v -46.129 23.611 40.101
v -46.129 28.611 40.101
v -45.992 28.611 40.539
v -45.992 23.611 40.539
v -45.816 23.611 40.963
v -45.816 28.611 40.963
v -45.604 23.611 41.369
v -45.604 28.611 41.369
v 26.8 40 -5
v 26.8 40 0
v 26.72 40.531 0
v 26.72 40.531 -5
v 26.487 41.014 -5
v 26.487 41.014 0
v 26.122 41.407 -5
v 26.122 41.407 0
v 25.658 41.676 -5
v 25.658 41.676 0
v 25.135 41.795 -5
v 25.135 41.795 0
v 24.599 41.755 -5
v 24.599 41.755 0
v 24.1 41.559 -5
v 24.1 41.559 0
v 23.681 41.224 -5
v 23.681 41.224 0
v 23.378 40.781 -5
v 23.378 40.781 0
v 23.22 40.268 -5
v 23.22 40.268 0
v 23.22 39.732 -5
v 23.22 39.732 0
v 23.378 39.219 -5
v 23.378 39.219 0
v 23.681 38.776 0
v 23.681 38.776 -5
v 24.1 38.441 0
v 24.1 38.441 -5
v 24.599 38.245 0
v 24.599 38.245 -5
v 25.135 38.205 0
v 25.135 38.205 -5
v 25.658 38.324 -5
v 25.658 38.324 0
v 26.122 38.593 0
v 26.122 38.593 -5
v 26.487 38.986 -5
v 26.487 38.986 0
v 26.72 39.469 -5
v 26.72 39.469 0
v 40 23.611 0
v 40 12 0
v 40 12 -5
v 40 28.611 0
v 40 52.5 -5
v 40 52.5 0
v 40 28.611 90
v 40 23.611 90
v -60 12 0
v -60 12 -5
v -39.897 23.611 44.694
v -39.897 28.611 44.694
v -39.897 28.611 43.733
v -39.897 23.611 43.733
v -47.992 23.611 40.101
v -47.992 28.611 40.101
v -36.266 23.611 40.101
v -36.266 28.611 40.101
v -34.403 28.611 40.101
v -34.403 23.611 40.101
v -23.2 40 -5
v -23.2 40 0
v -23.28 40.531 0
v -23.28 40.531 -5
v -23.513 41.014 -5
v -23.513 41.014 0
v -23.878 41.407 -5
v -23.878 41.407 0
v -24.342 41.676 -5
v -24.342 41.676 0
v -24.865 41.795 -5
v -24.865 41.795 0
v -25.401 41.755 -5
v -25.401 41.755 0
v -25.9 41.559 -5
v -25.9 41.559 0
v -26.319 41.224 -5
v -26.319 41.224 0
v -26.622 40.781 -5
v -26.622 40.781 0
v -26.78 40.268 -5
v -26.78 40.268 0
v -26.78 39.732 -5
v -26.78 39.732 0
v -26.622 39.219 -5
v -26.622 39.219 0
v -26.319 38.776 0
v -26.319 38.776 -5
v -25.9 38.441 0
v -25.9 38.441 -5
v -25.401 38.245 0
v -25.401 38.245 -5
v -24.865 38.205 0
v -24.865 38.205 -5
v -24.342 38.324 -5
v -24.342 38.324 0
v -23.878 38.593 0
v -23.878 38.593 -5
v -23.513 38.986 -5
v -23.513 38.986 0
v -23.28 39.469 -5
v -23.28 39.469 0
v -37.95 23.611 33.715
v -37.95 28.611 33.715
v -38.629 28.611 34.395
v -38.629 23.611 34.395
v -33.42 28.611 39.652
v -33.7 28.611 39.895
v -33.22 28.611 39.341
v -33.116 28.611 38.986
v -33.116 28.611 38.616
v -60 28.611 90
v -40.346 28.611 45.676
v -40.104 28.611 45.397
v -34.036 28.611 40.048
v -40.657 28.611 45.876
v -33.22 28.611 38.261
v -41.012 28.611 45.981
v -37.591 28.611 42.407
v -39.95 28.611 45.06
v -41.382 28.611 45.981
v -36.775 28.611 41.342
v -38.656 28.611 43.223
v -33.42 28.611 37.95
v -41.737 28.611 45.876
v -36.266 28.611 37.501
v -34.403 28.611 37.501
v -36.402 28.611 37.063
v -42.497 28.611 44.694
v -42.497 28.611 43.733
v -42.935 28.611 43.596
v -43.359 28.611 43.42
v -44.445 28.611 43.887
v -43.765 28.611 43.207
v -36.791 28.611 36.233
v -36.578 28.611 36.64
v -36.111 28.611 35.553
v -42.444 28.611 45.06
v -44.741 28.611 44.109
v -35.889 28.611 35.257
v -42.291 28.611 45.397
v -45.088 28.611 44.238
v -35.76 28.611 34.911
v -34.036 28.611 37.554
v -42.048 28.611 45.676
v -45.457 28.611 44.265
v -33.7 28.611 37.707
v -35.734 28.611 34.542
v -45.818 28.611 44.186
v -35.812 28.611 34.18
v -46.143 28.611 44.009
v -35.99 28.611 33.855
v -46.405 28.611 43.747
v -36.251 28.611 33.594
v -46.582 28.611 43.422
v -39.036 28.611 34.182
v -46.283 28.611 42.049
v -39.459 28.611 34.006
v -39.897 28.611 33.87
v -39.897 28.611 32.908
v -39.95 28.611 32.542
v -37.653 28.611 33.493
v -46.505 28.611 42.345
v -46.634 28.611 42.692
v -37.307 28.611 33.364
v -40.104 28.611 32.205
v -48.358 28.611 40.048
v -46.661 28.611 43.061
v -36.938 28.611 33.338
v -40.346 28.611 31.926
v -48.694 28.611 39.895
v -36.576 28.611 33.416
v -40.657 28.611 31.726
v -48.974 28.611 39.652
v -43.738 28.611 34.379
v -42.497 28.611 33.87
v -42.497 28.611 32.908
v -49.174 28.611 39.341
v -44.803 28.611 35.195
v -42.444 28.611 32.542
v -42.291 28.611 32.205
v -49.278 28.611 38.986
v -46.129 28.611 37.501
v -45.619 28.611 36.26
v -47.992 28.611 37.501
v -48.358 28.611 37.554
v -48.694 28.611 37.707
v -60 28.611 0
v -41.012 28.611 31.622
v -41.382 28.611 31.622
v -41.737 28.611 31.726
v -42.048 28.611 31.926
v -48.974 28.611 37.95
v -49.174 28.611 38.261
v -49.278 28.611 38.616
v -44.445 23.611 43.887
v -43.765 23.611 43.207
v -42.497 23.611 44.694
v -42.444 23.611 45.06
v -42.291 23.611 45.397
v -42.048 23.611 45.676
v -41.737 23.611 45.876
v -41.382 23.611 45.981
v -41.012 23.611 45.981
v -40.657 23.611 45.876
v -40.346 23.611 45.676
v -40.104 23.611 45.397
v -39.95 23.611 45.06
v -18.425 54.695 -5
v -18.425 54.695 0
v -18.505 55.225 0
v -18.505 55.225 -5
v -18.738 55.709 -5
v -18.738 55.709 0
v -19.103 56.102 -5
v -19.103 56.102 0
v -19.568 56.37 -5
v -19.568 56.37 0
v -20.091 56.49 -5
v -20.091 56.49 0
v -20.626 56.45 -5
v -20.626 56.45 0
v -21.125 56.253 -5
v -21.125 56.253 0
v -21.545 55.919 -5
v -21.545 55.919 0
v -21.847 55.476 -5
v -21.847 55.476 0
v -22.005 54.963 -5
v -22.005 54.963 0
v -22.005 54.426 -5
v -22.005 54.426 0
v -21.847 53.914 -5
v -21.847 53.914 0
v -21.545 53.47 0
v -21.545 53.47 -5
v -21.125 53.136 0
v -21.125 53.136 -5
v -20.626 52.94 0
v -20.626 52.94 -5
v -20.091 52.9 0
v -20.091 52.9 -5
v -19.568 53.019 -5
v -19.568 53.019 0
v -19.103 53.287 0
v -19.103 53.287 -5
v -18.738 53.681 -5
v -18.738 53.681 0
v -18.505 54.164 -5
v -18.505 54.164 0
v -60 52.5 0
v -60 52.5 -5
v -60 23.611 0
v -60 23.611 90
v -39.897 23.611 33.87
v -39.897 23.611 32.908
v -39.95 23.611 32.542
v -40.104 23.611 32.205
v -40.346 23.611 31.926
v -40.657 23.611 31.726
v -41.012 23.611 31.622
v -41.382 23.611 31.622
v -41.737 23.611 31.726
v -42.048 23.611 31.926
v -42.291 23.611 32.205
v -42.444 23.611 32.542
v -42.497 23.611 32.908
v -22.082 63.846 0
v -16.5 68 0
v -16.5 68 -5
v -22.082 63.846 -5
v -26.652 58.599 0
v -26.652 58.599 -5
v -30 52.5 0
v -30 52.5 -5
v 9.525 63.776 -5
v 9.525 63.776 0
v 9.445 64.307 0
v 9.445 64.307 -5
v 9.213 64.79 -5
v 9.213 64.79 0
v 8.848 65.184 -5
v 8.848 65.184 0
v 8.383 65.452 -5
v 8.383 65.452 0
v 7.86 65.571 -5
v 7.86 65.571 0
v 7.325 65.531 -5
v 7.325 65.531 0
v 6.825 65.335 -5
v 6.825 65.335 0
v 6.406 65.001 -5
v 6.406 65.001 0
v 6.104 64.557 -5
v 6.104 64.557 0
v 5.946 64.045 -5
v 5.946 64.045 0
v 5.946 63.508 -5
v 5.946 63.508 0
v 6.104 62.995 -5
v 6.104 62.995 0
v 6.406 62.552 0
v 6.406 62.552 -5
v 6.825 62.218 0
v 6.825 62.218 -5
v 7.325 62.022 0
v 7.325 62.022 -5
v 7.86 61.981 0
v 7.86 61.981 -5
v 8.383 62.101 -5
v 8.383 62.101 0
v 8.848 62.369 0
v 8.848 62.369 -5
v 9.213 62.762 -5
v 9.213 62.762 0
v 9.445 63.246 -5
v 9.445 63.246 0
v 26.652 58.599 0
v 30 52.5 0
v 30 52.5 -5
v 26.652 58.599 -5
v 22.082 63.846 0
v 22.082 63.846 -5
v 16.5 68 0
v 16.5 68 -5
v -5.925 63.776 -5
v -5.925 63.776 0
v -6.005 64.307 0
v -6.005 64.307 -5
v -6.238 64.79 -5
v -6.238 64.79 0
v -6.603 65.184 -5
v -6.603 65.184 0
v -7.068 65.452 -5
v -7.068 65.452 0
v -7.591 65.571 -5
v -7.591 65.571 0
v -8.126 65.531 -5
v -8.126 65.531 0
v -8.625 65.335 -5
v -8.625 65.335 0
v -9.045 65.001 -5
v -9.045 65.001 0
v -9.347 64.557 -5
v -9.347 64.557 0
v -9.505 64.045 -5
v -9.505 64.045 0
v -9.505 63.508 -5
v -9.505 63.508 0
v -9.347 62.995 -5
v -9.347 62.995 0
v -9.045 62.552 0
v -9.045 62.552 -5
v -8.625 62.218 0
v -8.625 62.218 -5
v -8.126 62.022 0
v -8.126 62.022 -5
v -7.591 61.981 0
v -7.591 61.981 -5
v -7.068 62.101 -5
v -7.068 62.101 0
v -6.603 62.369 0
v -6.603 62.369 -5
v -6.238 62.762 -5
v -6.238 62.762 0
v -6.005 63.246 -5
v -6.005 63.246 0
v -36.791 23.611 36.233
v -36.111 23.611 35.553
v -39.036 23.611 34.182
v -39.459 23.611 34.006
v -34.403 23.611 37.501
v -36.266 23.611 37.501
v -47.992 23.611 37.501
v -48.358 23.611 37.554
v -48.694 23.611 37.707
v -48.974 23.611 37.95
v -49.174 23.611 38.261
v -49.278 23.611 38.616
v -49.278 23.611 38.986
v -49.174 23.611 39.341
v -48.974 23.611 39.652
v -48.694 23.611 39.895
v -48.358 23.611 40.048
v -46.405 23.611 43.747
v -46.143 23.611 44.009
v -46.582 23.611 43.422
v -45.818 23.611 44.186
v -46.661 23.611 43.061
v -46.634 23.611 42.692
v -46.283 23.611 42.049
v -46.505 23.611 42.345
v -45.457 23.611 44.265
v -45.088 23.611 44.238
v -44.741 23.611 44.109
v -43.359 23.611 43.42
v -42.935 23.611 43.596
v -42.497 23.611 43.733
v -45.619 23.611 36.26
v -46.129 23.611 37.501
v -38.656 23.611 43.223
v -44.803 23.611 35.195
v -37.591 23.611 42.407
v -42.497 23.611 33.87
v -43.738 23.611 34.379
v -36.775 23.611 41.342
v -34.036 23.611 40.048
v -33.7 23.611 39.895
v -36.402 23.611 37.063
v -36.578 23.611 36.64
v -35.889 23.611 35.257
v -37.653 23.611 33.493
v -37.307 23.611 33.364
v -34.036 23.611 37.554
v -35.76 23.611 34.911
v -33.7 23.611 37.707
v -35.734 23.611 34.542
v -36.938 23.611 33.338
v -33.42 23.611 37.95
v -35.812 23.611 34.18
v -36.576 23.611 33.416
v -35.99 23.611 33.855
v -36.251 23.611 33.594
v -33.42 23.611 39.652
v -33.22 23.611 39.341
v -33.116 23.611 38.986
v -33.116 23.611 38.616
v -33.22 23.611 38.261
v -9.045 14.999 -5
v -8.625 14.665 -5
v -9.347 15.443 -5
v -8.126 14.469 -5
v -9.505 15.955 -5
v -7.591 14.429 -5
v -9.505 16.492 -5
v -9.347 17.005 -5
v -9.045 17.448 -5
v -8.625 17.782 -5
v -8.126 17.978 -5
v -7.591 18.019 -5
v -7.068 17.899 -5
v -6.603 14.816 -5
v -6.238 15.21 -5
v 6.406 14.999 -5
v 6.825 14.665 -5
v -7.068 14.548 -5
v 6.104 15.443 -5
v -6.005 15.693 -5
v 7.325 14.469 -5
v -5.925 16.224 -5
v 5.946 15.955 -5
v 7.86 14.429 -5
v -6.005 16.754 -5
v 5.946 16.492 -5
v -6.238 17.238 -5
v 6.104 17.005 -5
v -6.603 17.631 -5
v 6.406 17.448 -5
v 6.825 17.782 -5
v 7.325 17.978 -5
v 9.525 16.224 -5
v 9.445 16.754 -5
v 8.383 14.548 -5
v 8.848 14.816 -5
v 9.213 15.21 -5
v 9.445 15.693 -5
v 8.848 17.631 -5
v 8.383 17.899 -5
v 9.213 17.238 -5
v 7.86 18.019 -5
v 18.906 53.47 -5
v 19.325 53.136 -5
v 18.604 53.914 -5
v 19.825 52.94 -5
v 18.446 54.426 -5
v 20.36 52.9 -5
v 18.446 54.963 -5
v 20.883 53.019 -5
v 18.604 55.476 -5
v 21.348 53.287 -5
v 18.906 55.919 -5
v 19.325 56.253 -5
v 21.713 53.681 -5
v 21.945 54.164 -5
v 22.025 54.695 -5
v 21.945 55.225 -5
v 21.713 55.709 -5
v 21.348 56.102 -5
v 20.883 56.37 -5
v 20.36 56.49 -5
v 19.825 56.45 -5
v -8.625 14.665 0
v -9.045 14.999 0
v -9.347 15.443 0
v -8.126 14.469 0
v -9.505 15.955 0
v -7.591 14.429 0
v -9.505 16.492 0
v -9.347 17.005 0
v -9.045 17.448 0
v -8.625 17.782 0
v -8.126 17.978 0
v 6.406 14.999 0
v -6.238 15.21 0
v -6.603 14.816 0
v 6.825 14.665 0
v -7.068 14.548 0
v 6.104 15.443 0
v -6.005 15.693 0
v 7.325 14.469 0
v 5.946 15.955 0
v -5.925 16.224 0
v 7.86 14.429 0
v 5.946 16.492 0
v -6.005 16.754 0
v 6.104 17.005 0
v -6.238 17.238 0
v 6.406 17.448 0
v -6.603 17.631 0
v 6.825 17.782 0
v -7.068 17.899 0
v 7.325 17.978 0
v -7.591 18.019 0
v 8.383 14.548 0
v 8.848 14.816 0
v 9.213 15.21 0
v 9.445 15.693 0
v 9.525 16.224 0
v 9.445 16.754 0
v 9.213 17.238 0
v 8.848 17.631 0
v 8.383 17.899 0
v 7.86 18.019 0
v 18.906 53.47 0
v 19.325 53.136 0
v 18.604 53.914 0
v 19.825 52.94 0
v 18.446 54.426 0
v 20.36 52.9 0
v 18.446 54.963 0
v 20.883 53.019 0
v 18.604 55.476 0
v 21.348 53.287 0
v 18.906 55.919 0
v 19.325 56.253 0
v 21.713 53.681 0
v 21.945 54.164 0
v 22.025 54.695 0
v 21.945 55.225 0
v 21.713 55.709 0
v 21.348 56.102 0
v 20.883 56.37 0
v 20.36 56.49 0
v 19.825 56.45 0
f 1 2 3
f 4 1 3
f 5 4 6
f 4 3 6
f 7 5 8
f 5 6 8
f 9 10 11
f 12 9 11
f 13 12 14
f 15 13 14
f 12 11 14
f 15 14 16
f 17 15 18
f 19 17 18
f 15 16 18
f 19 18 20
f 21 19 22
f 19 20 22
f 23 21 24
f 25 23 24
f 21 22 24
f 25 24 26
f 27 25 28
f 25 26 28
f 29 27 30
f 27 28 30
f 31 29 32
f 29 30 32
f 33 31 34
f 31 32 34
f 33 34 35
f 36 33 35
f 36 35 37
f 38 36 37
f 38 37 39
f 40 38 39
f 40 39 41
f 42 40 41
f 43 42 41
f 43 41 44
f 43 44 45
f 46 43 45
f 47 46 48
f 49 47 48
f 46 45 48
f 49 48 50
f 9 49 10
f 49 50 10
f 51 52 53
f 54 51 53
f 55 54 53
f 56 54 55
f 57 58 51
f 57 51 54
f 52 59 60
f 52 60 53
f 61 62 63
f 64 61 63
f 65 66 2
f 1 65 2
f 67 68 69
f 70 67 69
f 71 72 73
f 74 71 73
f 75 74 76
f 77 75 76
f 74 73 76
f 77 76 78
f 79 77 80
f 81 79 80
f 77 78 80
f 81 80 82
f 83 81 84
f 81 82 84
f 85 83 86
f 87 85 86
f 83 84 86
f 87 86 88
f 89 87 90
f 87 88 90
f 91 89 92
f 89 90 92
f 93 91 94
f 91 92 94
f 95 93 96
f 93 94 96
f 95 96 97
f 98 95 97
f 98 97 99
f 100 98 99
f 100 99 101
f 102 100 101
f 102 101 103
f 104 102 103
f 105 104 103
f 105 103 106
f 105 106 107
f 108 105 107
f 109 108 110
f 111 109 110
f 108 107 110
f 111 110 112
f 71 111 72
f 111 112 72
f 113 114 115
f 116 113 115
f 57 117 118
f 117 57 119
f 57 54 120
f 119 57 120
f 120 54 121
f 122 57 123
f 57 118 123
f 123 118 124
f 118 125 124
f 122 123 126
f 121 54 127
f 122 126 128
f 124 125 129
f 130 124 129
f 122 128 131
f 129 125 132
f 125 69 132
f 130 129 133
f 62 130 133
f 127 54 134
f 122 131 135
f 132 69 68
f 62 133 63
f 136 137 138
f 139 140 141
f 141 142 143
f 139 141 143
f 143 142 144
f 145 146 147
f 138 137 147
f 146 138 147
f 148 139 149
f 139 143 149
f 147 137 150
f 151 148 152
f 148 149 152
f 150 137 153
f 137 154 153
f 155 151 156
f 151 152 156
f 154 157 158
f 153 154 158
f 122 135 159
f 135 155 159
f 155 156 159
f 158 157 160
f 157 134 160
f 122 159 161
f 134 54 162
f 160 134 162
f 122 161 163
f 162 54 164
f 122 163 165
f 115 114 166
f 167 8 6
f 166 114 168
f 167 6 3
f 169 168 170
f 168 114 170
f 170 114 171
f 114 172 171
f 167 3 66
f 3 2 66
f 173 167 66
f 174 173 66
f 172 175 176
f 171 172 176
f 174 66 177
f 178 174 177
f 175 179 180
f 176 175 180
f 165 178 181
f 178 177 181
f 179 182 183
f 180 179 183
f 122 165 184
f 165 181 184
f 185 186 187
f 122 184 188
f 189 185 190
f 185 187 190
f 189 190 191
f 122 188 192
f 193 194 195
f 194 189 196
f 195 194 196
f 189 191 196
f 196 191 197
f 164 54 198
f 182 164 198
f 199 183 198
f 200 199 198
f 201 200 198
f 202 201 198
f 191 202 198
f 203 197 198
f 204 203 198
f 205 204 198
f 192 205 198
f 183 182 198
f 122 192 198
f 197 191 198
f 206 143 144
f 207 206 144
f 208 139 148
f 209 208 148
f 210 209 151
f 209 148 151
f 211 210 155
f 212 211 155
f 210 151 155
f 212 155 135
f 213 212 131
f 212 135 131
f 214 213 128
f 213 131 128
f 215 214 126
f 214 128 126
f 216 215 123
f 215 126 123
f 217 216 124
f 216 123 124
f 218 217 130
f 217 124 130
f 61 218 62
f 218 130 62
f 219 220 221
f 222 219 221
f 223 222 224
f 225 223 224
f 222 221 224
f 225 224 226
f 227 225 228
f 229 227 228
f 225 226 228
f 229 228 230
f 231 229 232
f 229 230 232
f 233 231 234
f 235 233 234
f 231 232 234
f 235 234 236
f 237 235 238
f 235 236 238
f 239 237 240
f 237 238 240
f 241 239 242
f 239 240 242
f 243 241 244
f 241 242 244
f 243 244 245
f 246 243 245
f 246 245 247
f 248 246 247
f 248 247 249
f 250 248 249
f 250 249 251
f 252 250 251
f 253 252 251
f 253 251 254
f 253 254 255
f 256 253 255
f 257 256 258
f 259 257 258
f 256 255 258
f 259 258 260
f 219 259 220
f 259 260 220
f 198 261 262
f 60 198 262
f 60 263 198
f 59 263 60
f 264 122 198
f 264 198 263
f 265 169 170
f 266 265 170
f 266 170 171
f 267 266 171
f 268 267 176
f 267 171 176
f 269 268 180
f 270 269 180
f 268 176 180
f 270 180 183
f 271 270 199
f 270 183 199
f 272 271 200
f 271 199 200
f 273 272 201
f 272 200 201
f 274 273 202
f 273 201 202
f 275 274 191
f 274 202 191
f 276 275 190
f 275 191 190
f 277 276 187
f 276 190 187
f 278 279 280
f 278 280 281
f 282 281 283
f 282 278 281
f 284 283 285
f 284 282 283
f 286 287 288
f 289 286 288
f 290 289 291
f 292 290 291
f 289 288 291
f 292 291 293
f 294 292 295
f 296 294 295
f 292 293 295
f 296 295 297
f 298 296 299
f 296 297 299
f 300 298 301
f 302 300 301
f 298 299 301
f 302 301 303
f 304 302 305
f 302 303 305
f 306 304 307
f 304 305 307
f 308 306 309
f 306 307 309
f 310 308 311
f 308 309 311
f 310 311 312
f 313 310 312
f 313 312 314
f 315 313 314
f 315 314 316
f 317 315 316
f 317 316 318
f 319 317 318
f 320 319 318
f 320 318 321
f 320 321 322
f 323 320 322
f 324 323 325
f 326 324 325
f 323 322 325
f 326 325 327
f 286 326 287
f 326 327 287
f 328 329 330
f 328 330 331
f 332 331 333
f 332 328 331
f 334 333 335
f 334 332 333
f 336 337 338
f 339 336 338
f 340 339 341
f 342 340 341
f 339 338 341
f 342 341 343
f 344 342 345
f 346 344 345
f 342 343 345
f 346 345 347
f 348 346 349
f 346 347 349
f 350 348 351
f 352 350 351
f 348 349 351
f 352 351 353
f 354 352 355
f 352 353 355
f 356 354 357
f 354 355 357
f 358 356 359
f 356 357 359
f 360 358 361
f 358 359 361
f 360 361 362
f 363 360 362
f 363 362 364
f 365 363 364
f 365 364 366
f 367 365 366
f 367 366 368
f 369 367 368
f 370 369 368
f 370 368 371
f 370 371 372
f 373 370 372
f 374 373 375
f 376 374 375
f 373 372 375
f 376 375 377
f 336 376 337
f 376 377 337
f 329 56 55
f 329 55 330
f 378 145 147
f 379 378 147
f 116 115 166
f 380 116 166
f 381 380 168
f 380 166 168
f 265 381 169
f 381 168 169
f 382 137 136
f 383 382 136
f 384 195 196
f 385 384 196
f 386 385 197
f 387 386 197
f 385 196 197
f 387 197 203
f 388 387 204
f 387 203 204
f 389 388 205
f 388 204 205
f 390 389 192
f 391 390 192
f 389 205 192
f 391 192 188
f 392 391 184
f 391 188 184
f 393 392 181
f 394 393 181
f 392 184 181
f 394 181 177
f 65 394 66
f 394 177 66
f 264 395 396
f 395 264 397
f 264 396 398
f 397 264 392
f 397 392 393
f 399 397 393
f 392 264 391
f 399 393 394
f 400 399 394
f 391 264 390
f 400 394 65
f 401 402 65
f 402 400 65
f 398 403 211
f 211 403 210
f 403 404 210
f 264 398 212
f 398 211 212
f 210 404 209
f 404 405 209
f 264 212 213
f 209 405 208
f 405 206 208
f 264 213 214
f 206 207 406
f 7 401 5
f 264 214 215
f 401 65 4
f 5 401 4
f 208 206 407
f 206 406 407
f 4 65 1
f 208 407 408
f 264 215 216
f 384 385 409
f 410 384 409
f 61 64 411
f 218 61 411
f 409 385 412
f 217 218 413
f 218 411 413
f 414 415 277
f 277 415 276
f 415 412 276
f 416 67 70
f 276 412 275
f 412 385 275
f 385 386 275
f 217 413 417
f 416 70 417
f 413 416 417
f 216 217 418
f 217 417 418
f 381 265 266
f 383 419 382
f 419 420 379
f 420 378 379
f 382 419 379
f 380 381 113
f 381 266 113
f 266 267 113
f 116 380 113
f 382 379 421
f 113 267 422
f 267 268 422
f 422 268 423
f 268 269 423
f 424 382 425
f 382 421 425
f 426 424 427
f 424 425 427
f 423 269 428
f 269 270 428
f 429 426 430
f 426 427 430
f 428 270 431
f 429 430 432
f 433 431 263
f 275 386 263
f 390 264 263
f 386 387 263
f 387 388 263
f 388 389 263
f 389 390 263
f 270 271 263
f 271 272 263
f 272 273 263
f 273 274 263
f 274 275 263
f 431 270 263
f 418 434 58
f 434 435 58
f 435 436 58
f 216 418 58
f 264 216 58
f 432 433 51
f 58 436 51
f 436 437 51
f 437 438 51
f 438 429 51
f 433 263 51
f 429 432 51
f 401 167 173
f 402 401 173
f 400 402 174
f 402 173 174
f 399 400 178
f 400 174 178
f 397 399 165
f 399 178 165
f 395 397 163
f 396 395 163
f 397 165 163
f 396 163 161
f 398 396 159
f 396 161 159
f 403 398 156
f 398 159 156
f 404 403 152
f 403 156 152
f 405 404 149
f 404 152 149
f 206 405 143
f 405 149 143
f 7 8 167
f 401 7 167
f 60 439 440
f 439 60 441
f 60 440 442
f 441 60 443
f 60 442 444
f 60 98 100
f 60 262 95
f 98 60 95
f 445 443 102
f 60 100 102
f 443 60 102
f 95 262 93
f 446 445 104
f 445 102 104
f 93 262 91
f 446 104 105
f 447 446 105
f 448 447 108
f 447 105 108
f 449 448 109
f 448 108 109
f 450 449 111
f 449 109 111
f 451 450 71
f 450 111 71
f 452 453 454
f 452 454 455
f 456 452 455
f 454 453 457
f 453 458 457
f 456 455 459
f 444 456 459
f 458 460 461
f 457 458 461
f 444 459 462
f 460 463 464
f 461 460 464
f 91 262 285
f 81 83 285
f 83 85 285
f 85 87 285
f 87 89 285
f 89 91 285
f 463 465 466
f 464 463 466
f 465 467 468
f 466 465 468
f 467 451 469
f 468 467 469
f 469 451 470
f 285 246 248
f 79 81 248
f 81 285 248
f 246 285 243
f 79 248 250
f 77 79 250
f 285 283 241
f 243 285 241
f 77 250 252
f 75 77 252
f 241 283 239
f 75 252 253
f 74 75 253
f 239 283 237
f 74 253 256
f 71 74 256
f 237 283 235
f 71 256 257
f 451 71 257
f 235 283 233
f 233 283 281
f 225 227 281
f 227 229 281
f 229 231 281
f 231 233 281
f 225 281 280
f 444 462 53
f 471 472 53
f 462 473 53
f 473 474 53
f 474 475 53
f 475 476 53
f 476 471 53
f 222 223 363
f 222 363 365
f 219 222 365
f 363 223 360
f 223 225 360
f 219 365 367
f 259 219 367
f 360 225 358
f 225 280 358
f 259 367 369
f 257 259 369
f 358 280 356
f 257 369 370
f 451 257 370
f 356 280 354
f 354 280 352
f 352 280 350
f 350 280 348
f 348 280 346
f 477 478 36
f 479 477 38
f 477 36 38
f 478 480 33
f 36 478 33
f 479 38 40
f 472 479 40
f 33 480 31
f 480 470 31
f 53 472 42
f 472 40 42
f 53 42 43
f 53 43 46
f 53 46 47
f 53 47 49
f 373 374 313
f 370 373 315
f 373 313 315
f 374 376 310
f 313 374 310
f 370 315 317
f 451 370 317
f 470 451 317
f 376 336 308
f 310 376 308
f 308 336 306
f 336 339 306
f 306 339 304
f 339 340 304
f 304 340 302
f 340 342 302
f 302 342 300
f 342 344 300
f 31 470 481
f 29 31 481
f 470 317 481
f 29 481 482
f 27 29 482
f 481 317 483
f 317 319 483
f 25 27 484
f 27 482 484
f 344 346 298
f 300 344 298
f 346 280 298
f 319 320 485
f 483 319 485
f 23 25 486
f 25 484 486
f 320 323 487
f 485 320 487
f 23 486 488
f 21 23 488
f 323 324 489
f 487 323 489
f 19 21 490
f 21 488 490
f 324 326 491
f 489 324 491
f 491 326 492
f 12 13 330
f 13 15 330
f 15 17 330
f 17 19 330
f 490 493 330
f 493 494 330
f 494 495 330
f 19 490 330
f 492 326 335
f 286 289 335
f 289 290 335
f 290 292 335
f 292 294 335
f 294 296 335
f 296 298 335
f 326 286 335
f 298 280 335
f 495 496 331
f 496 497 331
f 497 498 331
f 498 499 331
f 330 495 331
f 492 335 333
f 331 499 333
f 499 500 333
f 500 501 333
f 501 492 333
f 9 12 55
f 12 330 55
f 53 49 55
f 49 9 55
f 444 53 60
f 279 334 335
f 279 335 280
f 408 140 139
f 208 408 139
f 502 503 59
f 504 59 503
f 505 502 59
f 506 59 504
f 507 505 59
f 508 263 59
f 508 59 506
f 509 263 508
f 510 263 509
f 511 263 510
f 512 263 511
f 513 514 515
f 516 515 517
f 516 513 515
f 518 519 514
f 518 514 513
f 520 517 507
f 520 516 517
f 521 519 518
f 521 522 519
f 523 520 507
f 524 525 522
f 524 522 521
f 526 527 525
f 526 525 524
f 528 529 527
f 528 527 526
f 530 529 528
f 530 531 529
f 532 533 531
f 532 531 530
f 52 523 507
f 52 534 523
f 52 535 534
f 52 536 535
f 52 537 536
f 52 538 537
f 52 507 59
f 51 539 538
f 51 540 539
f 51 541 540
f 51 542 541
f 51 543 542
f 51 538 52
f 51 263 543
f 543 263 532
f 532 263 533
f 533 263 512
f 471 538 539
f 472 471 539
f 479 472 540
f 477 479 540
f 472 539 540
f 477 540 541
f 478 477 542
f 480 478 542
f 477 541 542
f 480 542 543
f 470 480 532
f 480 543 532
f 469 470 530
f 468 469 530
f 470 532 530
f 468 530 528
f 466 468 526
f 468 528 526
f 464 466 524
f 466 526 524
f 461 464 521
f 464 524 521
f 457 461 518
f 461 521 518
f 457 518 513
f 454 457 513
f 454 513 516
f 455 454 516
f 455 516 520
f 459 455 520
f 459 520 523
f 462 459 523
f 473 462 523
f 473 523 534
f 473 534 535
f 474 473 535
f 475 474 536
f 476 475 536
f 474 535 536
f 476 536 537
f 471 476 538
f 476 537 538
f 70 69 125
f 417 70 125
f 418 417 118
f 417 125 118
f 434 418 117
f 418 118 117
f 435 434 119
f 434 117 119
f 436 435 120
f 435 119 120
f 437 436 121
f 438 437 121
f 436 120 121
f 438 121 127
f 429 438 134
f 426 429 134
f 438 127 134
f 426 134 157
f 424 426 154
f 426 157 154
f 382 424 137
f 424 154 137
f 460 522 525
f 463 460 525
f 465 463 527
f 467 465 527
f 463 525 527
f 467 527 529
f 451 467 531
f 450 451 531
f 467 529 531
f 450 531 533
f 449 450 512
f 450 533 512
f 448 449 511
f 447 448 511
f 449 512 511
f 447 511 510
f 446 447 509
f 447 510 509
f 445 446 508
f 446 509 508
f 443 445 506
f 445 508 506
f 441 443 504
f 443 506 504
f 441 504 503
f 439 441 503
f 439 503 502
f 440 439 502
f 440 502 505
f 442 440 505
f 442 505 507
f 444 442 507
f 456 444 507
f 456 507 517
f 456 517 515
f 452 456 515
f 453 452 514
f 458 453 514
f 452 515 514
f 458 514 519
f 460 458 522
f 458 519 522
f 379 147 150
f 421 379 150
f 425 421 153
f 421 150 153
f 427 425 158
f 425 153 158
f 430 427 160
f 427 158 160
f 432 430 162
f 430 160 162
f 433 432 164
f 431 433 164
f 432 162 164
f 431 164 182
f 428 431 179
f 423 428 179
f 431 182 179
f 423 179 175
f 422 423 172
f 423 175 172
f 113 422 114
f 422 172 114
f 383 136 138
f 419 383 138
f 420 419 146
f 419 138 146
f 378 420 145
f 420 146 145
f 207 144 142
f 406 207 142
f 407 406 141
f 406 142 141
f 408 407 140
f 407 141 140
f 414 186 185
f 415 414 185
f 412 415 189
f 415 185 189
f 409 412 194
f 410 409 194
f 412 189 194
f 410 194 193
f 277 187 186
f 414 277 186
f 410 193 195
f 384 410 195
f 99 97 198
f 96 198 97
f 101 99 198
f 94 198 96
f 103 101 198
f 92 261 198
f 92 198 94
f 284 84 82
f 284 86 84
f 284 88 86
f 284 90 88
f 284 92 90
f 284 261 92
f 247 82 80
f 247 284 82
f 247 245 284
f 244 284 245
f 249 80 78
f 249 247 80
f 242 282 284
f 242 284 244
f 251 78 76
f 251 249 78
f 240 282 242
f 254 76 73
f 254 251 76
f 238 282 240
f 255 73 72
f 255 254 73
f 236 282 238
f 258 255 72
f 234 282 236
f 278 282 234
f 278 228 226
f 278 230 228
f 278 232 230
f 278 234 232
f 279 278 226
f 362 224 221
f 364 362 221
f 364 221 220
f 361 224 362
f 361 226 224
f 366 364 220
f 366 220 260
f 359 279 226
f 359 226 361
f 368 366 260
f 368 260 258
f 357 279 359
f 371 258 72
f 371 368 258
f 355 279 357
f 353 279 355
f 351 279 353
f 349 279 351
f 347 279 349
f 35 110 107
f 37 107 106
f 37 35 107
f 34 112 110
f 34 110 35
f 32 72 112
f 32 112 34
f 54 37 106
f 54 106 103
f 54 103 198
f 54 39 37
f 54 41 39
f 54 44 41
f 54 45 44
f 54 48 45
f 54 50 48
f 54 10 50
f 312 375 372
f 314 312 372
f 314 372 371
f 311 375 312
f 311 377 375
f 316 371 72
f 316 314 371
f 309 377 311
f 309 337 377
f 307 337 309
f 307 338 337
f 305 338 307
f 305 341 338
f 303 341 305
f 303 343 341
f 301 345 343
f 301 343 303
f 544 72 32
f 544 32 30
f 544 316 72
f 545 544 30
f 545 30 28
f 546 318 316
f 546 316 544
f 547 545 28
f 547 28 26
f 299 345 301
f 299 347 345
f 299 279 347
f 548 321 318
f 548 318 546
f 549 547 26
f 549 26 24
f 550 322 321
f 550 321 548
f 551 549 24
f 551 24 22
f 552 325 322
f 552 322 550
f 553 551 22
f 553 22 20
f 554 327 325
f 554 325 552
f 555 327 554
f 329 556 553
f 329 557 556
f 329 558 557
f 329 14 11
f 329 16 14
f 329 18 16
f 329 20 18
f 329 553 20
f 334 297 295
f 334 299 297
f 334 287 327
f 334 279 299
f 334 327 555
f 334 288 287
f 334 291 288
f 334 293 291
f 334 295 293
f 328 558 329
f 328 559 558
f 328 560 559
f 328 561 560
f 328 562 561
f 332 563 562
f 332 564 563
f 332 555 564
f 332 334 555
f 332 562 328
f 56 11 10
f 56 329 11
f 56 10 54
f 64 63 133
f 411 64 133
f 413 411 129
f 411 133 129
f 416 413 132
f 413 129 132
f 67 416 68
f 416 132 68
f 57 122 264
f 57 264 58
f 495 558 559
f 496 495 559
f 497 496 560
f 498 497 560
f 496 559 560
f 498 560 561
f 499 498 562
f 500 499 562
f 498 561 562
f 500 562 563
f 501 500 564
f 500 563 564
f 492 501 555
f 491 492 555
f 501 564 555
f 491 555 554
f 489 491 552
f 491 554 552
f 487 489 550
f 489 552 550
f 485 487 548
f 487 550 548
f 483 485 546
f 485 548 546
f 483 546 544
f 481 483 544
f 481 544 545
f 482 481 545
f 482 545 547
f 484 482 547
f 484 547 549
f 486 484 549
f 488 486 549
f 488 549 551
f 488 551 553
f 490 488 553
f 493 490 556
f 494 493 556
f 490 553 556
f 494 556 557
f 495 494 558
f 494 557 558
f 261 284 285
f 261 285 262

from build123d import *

# Parameters (mm, degrees)
SKETCH2_R           = 1.8
BOSS_EXTRUDE1_DEPTH = 5
SKETCH3_R           = 1.8
BOSS_EXTRUDE2_DEPTH = 5
BOSS_EXTRUDE3_DEPTH = 90
SKETCH5_R           = 0.927
CUT_EXTRUDE3_DEPTH  = 90
CUT_EXTRUDE4_DEPTH  = 90


with BuildPart() as part:
    # Sketch2 → Boss-Extrude1 (new body)
    with BuildSketch(Plane.XY):
        with BuildLine():
            ThreePointArc((30, 52.5), (24.507651866, 61.345374206), (16.5, 68))
            Line((16.5, 68), (-16.5, 68))
            ThreePointArc((-16.5, 68), (-24.507651866, 61.345374206), (-30, 52.5))
            Line((-30, 52.5), (-60, 52.5))
            Line((-60, 52.5), (-60, 12))
            Line((-60, 12), (40, 12))
            Line((40, 12), (40, 52.5))
            Line((40, 52.5), (30, 52.5))
        make_face()
        with Locations((-20.225424859, 25.305368693)):
            Circle(SKETCH2_R, mode=Mode.SUBTRACT)
        with Locations((-25, 40)):
            Circle(SKETCH2_R, mode=Mode.SUBTRACT)
        with Locations((-7.725424859, 16.223587093)):
            Circle(SKETCH2_R, mode=Mode.SUBTRACT)
        with Locations((7.725424859, 16.223587093)):
            Circle(SKETCH2_R, mode=Mode.SUBTRACT)
        with Locations((20.225424859, 25.305368693)):
            Circle(SKETCH2_R, mode=Mode.SUBTRACT)
        with Locations((25, 40)):
            Circle(SKETCH2_R, mode=Mode.SUBTRACT)
        with Locations((-20.225424859, 54.694631307)):
            Circle(SKETCH2_R, mode=Mode.SUBTRACT)
        with Locations((-7.725424859, 63.776412907)):
            Circle(SKETCH2_R, mode=Mode.SUBTRACT)
        with Locations((7.725424859, 63.776412907)):
            Circle(SKETCH2_R, mode=Mode.SUBTRACT)
        with Locations((20.225424859, 54.694631307)):
            Circle(SKETCH2_R, mode=Mode.SUBTRACT)
    extrude(amount=-BOSS_EXTRUDE1_DEPTH)

    # Sketch3 → Boss-Extrude2 (add)
    with BuildSketch(Plane.XY):
        with Locations((-20.225424859, 25.305368693)):
            Circle(SKETCH3_R)
        with Locations((20.225424859, 25.305368693)):
            Circle(SKETCH3_R)
    extrude(amount=-BOSS_EXTRUDE2_DEPTH)

    # Sketch4 → Boss-Extrude3 (add)
    with BuildSketch(Plane.XY):
        Polygon((15.062255845, 23.611), (32.664455845, 23.611), (40, 23.611), (40, 28.611), (-60, 28.611), (-60, 23.611), align=None)
    extrude(amount=BOSS_EXTRUDE3_DEPTH)

    # Sketch5 → Cut-Extrude3 (cut)
    with BuildSketch(Plane(origin=(0, 28.611, 0), x_dir=(1, 0, 0), z_dir=(0, 1, 0))):
        with BuildLine():
            Line((-40.197151893, -34.106422162), (-40.197151893, -32.9083))
            ThreePointArc((-40.197151893, -32.9083), (-41.197151893, -31.9083), (-42.197151893, -32.9083))
            Line((-42.197151893, -32.9083), (-42.197151893, -34.106422162))
            ThreePointArc((-42.197151893, -34.106422162), (-44.591264443, -35.40698745), (-45.891829731, -37.8011))
            Line((-45.891829731, -37.8011), (-47.991651893, -37.8011))
            ThreePointArc((-47.991651893, -37.8011), (-48.991651893, -38.8011), (-47.991651893, -39.8011))
            Line((-47.991651893, -39.8011), (-45.891829731, -39.8011))
            ThreePointArc((-45.891829731, -39.8011), (-45.631773649, -40.637980475), (-45.223897209, -41.413631753))
            Line((-45.223897209, -41.413631753), (-46.071097514, -42.260832059))
            ThreePointArc((-46.071097514, -42.260832059), (-46.071097514, -43.675045621), (-44.656883952, -43.675045621))
            Line((-44.656883952, -43.675045621), (-43.809683646, -42.827845316))
            ThreePointArc((-43.809683646, -42.827845316), (-43.034032368, -43.235721756), (-42.197151893, -43.495777838))
            Line((-42.197151893, -43.495777838), (-42.197151893, -44.6939))
            ThreePointArc((-42.197151893, -44.6939), (-41.197151893, -45.6939), (-40.197151893, -44.6939))
            Line((-40.197151893, -44.6939), (-40.197151893, -43.495777838))
            ThreePointArc((-40.197151893, -43.495777838), (-37.803039343, -42.19521255), (-36.502474055, -39.8011))
            Line((-36.502474055, -39.8011), (-34.402651893, -39.8011))
            ThreePointArc((-34.402651893, -39.8011), (-33.402651893, -38.8011), (-34.402651893, -37.8011))
            Line((-34.402651893, -37.8011), (-36.502474055, -37.8011))
            ThreePointArc((-36.502474055, -37.8011), (-36.762530137, -36.964219525), (-37.170406577, -36.188568247))
            Line((-37.170406577, -36.188568247), (-36.323206271, -35.341367941))
            ThreePointArc((-36.323206271, -35.341367941), (-36.323206271, -33.927154379), (-37.737419834, -33.927154379))
            Line((-37.737419834, -33.927154379), (-38.584620139, -34.774354684))
            ThreePointArc((-38.584620139, -34.774354684), (-39.360271417, -34.366478244), (-40.197151893, -34.106422162))
        make_face()
        with Locations((-41.197151893, -32.9083)):
            Circle(SKETCH5_R, mode=Mode.SUBTRACT)
        with BuildLine():
            ThreePointArc((-45.584634087, -37.8011), (-44.379132408, -35.619119485), (-42.197151893, -34.413617806))
            Line((-42.197151893, -34.413617806), (-42.197151893, -37.8011))
            Line((-42.197151893, -37.8011), (-45.584634087, -37.8011))
        make_face(mode=Mode.SUBTRACT)
        with BuildLine():
            ThreePointArc((-40.197151893, -34.413617806), (-39.475076447, -34.643642104), (-38.801840263, -34.991574807))
            Line((-38.801840263, -34.991574807), (-40.197151893, -36.386886438))
            Line((-40.197151893, -36.386886438), (-40.197151893, -34.413617806))
        make_face(mode=Mode.SUBTRACT)
        with BuildLine():
            Line((-45.584634087, -39.8011), (-43.611365455, -39.8011))
            Line((-43.611365455, -39.8011), (-45.006677086, -41.19641163))
            ThreePointArc((-45.006677086, -41.19641163), (-45.354609789, -40.523175446), (-45.584634087, -39.8011))
        make_face(mode=Mode.SUBTRACT)
        with BuildLine():
            ThreePointArc((-37.3876267, -36.40578837), (-37.039693997, -37.079024554), (-36.809669699, -37.8011))
            Line((-36.809669699, -37.8011), (-38.78293833, -37.8011))
            Line((-38.78293833, -37.8011), (-37.3876267, -36.40578837))
        make_face(mode=Mode.SUBTRACT)
        with Locations((-47.991651893, -38.8011)):
            Circle(SKETCH5_R, mode=Mode.SUBTRACT)
        with BuildLine():
            Line((-43.592463523, -42.610625193), (-42.197151893, -41.215313562))
            Line((-42.197151893, -41.215313562), (-42.197151893, -43.188582194))
            ThreePointArc((-42.197151893, -43.188582194), (-42.919227338, -42.958557896), (-43.592463523, -42.610625193))
        make_face(mode=Mode.SUBTRACT)
        with BuildLine():
            ThreePointArc((-36.809669699, -39.8011), (-38.015171378, -41.983080515), (-40.197151893, -43.188582194))
            Line((-40.197151893, -43.188582194), (-40.197151893, -39.8011))
            Line((-40.197151893, -39.8011), (-36.809669699, -39.8011))
        make_face(mode=Mode.SUBTRACT)
        with Locations((-34.402651893, -38.8011)):
            Circle(SKETCH5_R, mode=Mode.SUBTRACT)
        with Locations((-41.197151893, -44.6939)):
            Circle(SKETCH5_R, mode=Mode.SUBTRACT)
    extrude(amount=-CUT_EXTRUDE3_DEPTH, mode=Mode.SUBTRACT)


with BuildPart() as cut_extrude3_kept_piece:
    # of the separate pieces the step leaves, the one the design keeps (cut_extrude3_pieces_kept)
    add(part.part.solids().sort_by_distance((30, 52.5, 0))[0])

    # Sketch6 → Cut-Extrude4 (cut)
    with BuildSketch(Plane(origin=(0, 28.611, 0), x_dir=(1, 0, 0), z_dir=(0, 1, 0))):
        with BuildLine():
            Line((-37.949551868, -33.715022344), (-38.629271554, -34.39474203))
            ThreePointArc((-38.629271554, -34.39474203), (-39.245466388, -34.089314384), (-39.897151893, -33.869568798))
            Line((-39.897151893, -33.869568798), (-39.897151893, -32.9083))
            ThreePointArc((-39.897151893, -32.9083), (-41.197151893, -31.6083), (-42.497151893, -32.9083))
            Line((-42.497151893, -32.9083), (-42.497151893, -33.869568798))
            ThreePointArc((-42.497151893, -33.869568798), (-44.803396477, -35.194855416), (-46.128683095, -37.5011))
            Line((-46.128683095, -37.5011), (-47.991651893, -37.5011))
            ThreePointArc((-47.991651893, -37.5011), (-49.291651893, -38.8011), (-47.991651893, -40.1011))
            Line((-47.991651893, -40.1011), (-46.128683095, -40.1011))
            ThreePointArc((-46.128683095, -40.1011), (-45.908937509, -40.752785505), (-45.603509863, -41.368980339))
            Line((-45.603509863, -41.368980339), (-46.283229549, -42.048700025))
            ThreePointArc((-46.283229549, -42.048700025), (-46.283229549, -43.887177656), (-44.444751917, -43.887177656))
            Line((-44.444751917, -43.887177656), (-43.765032232, -43.20745797))
            ThreePointArc((-43.765032232, -43.20745797), (-43.148837398, -43.512885616), (-42.497151893, -43.732631202))
            Line((-42.497151893, -43.732631202), (-42.497151893, -44.6939))
            ThreePointArc((-42.497151893, -44.6939), (-41.197151893, -45.9939), (-39.897151893, -44.6939))
            Line((-39.897151893, -44.6939), (-39.897151893, -43.732631202))
            ThreePointArc((-39.897151893, -43.732631202), (-37.590907309, -42.407344584), (-36.26562069, -40.1011))
            Line((-36.26562069, -40.1011), (-34.402651893, -40.1011))
            ThreePointArc((-34.402651893, -40.1011), (-33.102651893, -38.8011), (-34.402651893, -37.5011))
            Line((-34.402651893, -37.5011), (-36.26562069, -37.5011))
            ThreePointArc((-36.26562069, -37.5011), (-36.485366277, -36.849414495), (-36.790793922, -36.233219661))
            Line((-36.790793922, -36.233219661), (-36.111074237, -35.553499975))
            ThreePointArc((-36.111074237, -35.553499975), (-36.111074237, -33.715022344), (-37.949551868, -33.715022344))
        make_face()
        with BuildLine():
            Line((-37.737419834, -33.927154379), (-38.584620139, -34.774354684))
            ThreePointArc((-38.584620139, -34.774354684), (-39.360271417, -34.366478244), (-40.197151893, -34.106422162))
            Line((-40.197151893, -34.106422162), (-40.197151893, -32.9083))
            ThreePointArc((-40.197151893, -32.9083), (-41.197151893, -31.9083), (-42.197151893, -32.9083))
            Line((-42.197151893, -32.9083), (-42.197151893, -34.106422162))
            ThreePointArc((-42.197151893, -34.106422162), (-44.591264443, -35.40698745), (-45.891829731, -37.8011))
            Line((-45.891829731, -37.8011), (-47.991651893, -37.8011))
            ThreePointArc((-47.991651893, -37.8011), (-48.991651893, -38.8011), (-47.991651893, -39.8011))
            Line((-47.991651893, -39.8011), (-45.891829731, -39.8011))
            ThreePointArc((-45.891829731, -39.8011), (-45.631773649, -40.637980475), (-45.223897209, -41.413631753))
            Line((-45.223897209, -41.413631753), (-46.071097514, -42.260832059))
            ThreePointArc((-46.071097514, -42.260832059), (-46.071097514, -43.675045621), (-44.656883952, -43.675045621))
            Line((-44.656883952, -43.675045621), (-43.809683646, -42.827845316))
            ThreePointArc((-43.809683646, -42.827845316), (-43.034032368, -43.235721756), (-42.197151893, -43.495777838))
            Line((-42.197151893, -43.495777838), (-42.197151893, -44.6939))
            ThreePointArc((-42.197151893, -44.6939), (-41.197151893, -45.6939), (-40.197151893, -44.6939))
            Line((-40.197151893, -44.6939), (-40.197151893, -43.495777838))
            ThreePointArc((-40.197151893, -43.495777838), (-37.803039343, -42.19521255), (-36.502474055, -39.8011))
            Line((-36.502474055, -39.8011), (-34.402651893, -39.8011))
            ThreePointArc((-34.402651893, -39.8011), (-33.402651893, -38.8011), (-34.402651893, -37.8011))
            Line((-34.402651893, -37.8011), (-36.502474055, -37.8011))
            ThreePointArc((-36.502474055, -37.8011), (-36.762530137, -36.964219525), (-37.170406577, -36.188568247))
            Line((-37.170406577, -36.188568247), (-36.323206271, -35.341367941))
            ThreePointArc((-36.323206271, -35.341367941), (-36.323206271, -33.927154379), (-37.737419834, -33.927154379))
        make_face(mode=Mode.SUBTRACT)
    extrude(amount=-CUT_EXTRUDE4_DEPTH, mode=Mode.SUBTRACT)


solid = cut_extrude3_kept_piece.part
